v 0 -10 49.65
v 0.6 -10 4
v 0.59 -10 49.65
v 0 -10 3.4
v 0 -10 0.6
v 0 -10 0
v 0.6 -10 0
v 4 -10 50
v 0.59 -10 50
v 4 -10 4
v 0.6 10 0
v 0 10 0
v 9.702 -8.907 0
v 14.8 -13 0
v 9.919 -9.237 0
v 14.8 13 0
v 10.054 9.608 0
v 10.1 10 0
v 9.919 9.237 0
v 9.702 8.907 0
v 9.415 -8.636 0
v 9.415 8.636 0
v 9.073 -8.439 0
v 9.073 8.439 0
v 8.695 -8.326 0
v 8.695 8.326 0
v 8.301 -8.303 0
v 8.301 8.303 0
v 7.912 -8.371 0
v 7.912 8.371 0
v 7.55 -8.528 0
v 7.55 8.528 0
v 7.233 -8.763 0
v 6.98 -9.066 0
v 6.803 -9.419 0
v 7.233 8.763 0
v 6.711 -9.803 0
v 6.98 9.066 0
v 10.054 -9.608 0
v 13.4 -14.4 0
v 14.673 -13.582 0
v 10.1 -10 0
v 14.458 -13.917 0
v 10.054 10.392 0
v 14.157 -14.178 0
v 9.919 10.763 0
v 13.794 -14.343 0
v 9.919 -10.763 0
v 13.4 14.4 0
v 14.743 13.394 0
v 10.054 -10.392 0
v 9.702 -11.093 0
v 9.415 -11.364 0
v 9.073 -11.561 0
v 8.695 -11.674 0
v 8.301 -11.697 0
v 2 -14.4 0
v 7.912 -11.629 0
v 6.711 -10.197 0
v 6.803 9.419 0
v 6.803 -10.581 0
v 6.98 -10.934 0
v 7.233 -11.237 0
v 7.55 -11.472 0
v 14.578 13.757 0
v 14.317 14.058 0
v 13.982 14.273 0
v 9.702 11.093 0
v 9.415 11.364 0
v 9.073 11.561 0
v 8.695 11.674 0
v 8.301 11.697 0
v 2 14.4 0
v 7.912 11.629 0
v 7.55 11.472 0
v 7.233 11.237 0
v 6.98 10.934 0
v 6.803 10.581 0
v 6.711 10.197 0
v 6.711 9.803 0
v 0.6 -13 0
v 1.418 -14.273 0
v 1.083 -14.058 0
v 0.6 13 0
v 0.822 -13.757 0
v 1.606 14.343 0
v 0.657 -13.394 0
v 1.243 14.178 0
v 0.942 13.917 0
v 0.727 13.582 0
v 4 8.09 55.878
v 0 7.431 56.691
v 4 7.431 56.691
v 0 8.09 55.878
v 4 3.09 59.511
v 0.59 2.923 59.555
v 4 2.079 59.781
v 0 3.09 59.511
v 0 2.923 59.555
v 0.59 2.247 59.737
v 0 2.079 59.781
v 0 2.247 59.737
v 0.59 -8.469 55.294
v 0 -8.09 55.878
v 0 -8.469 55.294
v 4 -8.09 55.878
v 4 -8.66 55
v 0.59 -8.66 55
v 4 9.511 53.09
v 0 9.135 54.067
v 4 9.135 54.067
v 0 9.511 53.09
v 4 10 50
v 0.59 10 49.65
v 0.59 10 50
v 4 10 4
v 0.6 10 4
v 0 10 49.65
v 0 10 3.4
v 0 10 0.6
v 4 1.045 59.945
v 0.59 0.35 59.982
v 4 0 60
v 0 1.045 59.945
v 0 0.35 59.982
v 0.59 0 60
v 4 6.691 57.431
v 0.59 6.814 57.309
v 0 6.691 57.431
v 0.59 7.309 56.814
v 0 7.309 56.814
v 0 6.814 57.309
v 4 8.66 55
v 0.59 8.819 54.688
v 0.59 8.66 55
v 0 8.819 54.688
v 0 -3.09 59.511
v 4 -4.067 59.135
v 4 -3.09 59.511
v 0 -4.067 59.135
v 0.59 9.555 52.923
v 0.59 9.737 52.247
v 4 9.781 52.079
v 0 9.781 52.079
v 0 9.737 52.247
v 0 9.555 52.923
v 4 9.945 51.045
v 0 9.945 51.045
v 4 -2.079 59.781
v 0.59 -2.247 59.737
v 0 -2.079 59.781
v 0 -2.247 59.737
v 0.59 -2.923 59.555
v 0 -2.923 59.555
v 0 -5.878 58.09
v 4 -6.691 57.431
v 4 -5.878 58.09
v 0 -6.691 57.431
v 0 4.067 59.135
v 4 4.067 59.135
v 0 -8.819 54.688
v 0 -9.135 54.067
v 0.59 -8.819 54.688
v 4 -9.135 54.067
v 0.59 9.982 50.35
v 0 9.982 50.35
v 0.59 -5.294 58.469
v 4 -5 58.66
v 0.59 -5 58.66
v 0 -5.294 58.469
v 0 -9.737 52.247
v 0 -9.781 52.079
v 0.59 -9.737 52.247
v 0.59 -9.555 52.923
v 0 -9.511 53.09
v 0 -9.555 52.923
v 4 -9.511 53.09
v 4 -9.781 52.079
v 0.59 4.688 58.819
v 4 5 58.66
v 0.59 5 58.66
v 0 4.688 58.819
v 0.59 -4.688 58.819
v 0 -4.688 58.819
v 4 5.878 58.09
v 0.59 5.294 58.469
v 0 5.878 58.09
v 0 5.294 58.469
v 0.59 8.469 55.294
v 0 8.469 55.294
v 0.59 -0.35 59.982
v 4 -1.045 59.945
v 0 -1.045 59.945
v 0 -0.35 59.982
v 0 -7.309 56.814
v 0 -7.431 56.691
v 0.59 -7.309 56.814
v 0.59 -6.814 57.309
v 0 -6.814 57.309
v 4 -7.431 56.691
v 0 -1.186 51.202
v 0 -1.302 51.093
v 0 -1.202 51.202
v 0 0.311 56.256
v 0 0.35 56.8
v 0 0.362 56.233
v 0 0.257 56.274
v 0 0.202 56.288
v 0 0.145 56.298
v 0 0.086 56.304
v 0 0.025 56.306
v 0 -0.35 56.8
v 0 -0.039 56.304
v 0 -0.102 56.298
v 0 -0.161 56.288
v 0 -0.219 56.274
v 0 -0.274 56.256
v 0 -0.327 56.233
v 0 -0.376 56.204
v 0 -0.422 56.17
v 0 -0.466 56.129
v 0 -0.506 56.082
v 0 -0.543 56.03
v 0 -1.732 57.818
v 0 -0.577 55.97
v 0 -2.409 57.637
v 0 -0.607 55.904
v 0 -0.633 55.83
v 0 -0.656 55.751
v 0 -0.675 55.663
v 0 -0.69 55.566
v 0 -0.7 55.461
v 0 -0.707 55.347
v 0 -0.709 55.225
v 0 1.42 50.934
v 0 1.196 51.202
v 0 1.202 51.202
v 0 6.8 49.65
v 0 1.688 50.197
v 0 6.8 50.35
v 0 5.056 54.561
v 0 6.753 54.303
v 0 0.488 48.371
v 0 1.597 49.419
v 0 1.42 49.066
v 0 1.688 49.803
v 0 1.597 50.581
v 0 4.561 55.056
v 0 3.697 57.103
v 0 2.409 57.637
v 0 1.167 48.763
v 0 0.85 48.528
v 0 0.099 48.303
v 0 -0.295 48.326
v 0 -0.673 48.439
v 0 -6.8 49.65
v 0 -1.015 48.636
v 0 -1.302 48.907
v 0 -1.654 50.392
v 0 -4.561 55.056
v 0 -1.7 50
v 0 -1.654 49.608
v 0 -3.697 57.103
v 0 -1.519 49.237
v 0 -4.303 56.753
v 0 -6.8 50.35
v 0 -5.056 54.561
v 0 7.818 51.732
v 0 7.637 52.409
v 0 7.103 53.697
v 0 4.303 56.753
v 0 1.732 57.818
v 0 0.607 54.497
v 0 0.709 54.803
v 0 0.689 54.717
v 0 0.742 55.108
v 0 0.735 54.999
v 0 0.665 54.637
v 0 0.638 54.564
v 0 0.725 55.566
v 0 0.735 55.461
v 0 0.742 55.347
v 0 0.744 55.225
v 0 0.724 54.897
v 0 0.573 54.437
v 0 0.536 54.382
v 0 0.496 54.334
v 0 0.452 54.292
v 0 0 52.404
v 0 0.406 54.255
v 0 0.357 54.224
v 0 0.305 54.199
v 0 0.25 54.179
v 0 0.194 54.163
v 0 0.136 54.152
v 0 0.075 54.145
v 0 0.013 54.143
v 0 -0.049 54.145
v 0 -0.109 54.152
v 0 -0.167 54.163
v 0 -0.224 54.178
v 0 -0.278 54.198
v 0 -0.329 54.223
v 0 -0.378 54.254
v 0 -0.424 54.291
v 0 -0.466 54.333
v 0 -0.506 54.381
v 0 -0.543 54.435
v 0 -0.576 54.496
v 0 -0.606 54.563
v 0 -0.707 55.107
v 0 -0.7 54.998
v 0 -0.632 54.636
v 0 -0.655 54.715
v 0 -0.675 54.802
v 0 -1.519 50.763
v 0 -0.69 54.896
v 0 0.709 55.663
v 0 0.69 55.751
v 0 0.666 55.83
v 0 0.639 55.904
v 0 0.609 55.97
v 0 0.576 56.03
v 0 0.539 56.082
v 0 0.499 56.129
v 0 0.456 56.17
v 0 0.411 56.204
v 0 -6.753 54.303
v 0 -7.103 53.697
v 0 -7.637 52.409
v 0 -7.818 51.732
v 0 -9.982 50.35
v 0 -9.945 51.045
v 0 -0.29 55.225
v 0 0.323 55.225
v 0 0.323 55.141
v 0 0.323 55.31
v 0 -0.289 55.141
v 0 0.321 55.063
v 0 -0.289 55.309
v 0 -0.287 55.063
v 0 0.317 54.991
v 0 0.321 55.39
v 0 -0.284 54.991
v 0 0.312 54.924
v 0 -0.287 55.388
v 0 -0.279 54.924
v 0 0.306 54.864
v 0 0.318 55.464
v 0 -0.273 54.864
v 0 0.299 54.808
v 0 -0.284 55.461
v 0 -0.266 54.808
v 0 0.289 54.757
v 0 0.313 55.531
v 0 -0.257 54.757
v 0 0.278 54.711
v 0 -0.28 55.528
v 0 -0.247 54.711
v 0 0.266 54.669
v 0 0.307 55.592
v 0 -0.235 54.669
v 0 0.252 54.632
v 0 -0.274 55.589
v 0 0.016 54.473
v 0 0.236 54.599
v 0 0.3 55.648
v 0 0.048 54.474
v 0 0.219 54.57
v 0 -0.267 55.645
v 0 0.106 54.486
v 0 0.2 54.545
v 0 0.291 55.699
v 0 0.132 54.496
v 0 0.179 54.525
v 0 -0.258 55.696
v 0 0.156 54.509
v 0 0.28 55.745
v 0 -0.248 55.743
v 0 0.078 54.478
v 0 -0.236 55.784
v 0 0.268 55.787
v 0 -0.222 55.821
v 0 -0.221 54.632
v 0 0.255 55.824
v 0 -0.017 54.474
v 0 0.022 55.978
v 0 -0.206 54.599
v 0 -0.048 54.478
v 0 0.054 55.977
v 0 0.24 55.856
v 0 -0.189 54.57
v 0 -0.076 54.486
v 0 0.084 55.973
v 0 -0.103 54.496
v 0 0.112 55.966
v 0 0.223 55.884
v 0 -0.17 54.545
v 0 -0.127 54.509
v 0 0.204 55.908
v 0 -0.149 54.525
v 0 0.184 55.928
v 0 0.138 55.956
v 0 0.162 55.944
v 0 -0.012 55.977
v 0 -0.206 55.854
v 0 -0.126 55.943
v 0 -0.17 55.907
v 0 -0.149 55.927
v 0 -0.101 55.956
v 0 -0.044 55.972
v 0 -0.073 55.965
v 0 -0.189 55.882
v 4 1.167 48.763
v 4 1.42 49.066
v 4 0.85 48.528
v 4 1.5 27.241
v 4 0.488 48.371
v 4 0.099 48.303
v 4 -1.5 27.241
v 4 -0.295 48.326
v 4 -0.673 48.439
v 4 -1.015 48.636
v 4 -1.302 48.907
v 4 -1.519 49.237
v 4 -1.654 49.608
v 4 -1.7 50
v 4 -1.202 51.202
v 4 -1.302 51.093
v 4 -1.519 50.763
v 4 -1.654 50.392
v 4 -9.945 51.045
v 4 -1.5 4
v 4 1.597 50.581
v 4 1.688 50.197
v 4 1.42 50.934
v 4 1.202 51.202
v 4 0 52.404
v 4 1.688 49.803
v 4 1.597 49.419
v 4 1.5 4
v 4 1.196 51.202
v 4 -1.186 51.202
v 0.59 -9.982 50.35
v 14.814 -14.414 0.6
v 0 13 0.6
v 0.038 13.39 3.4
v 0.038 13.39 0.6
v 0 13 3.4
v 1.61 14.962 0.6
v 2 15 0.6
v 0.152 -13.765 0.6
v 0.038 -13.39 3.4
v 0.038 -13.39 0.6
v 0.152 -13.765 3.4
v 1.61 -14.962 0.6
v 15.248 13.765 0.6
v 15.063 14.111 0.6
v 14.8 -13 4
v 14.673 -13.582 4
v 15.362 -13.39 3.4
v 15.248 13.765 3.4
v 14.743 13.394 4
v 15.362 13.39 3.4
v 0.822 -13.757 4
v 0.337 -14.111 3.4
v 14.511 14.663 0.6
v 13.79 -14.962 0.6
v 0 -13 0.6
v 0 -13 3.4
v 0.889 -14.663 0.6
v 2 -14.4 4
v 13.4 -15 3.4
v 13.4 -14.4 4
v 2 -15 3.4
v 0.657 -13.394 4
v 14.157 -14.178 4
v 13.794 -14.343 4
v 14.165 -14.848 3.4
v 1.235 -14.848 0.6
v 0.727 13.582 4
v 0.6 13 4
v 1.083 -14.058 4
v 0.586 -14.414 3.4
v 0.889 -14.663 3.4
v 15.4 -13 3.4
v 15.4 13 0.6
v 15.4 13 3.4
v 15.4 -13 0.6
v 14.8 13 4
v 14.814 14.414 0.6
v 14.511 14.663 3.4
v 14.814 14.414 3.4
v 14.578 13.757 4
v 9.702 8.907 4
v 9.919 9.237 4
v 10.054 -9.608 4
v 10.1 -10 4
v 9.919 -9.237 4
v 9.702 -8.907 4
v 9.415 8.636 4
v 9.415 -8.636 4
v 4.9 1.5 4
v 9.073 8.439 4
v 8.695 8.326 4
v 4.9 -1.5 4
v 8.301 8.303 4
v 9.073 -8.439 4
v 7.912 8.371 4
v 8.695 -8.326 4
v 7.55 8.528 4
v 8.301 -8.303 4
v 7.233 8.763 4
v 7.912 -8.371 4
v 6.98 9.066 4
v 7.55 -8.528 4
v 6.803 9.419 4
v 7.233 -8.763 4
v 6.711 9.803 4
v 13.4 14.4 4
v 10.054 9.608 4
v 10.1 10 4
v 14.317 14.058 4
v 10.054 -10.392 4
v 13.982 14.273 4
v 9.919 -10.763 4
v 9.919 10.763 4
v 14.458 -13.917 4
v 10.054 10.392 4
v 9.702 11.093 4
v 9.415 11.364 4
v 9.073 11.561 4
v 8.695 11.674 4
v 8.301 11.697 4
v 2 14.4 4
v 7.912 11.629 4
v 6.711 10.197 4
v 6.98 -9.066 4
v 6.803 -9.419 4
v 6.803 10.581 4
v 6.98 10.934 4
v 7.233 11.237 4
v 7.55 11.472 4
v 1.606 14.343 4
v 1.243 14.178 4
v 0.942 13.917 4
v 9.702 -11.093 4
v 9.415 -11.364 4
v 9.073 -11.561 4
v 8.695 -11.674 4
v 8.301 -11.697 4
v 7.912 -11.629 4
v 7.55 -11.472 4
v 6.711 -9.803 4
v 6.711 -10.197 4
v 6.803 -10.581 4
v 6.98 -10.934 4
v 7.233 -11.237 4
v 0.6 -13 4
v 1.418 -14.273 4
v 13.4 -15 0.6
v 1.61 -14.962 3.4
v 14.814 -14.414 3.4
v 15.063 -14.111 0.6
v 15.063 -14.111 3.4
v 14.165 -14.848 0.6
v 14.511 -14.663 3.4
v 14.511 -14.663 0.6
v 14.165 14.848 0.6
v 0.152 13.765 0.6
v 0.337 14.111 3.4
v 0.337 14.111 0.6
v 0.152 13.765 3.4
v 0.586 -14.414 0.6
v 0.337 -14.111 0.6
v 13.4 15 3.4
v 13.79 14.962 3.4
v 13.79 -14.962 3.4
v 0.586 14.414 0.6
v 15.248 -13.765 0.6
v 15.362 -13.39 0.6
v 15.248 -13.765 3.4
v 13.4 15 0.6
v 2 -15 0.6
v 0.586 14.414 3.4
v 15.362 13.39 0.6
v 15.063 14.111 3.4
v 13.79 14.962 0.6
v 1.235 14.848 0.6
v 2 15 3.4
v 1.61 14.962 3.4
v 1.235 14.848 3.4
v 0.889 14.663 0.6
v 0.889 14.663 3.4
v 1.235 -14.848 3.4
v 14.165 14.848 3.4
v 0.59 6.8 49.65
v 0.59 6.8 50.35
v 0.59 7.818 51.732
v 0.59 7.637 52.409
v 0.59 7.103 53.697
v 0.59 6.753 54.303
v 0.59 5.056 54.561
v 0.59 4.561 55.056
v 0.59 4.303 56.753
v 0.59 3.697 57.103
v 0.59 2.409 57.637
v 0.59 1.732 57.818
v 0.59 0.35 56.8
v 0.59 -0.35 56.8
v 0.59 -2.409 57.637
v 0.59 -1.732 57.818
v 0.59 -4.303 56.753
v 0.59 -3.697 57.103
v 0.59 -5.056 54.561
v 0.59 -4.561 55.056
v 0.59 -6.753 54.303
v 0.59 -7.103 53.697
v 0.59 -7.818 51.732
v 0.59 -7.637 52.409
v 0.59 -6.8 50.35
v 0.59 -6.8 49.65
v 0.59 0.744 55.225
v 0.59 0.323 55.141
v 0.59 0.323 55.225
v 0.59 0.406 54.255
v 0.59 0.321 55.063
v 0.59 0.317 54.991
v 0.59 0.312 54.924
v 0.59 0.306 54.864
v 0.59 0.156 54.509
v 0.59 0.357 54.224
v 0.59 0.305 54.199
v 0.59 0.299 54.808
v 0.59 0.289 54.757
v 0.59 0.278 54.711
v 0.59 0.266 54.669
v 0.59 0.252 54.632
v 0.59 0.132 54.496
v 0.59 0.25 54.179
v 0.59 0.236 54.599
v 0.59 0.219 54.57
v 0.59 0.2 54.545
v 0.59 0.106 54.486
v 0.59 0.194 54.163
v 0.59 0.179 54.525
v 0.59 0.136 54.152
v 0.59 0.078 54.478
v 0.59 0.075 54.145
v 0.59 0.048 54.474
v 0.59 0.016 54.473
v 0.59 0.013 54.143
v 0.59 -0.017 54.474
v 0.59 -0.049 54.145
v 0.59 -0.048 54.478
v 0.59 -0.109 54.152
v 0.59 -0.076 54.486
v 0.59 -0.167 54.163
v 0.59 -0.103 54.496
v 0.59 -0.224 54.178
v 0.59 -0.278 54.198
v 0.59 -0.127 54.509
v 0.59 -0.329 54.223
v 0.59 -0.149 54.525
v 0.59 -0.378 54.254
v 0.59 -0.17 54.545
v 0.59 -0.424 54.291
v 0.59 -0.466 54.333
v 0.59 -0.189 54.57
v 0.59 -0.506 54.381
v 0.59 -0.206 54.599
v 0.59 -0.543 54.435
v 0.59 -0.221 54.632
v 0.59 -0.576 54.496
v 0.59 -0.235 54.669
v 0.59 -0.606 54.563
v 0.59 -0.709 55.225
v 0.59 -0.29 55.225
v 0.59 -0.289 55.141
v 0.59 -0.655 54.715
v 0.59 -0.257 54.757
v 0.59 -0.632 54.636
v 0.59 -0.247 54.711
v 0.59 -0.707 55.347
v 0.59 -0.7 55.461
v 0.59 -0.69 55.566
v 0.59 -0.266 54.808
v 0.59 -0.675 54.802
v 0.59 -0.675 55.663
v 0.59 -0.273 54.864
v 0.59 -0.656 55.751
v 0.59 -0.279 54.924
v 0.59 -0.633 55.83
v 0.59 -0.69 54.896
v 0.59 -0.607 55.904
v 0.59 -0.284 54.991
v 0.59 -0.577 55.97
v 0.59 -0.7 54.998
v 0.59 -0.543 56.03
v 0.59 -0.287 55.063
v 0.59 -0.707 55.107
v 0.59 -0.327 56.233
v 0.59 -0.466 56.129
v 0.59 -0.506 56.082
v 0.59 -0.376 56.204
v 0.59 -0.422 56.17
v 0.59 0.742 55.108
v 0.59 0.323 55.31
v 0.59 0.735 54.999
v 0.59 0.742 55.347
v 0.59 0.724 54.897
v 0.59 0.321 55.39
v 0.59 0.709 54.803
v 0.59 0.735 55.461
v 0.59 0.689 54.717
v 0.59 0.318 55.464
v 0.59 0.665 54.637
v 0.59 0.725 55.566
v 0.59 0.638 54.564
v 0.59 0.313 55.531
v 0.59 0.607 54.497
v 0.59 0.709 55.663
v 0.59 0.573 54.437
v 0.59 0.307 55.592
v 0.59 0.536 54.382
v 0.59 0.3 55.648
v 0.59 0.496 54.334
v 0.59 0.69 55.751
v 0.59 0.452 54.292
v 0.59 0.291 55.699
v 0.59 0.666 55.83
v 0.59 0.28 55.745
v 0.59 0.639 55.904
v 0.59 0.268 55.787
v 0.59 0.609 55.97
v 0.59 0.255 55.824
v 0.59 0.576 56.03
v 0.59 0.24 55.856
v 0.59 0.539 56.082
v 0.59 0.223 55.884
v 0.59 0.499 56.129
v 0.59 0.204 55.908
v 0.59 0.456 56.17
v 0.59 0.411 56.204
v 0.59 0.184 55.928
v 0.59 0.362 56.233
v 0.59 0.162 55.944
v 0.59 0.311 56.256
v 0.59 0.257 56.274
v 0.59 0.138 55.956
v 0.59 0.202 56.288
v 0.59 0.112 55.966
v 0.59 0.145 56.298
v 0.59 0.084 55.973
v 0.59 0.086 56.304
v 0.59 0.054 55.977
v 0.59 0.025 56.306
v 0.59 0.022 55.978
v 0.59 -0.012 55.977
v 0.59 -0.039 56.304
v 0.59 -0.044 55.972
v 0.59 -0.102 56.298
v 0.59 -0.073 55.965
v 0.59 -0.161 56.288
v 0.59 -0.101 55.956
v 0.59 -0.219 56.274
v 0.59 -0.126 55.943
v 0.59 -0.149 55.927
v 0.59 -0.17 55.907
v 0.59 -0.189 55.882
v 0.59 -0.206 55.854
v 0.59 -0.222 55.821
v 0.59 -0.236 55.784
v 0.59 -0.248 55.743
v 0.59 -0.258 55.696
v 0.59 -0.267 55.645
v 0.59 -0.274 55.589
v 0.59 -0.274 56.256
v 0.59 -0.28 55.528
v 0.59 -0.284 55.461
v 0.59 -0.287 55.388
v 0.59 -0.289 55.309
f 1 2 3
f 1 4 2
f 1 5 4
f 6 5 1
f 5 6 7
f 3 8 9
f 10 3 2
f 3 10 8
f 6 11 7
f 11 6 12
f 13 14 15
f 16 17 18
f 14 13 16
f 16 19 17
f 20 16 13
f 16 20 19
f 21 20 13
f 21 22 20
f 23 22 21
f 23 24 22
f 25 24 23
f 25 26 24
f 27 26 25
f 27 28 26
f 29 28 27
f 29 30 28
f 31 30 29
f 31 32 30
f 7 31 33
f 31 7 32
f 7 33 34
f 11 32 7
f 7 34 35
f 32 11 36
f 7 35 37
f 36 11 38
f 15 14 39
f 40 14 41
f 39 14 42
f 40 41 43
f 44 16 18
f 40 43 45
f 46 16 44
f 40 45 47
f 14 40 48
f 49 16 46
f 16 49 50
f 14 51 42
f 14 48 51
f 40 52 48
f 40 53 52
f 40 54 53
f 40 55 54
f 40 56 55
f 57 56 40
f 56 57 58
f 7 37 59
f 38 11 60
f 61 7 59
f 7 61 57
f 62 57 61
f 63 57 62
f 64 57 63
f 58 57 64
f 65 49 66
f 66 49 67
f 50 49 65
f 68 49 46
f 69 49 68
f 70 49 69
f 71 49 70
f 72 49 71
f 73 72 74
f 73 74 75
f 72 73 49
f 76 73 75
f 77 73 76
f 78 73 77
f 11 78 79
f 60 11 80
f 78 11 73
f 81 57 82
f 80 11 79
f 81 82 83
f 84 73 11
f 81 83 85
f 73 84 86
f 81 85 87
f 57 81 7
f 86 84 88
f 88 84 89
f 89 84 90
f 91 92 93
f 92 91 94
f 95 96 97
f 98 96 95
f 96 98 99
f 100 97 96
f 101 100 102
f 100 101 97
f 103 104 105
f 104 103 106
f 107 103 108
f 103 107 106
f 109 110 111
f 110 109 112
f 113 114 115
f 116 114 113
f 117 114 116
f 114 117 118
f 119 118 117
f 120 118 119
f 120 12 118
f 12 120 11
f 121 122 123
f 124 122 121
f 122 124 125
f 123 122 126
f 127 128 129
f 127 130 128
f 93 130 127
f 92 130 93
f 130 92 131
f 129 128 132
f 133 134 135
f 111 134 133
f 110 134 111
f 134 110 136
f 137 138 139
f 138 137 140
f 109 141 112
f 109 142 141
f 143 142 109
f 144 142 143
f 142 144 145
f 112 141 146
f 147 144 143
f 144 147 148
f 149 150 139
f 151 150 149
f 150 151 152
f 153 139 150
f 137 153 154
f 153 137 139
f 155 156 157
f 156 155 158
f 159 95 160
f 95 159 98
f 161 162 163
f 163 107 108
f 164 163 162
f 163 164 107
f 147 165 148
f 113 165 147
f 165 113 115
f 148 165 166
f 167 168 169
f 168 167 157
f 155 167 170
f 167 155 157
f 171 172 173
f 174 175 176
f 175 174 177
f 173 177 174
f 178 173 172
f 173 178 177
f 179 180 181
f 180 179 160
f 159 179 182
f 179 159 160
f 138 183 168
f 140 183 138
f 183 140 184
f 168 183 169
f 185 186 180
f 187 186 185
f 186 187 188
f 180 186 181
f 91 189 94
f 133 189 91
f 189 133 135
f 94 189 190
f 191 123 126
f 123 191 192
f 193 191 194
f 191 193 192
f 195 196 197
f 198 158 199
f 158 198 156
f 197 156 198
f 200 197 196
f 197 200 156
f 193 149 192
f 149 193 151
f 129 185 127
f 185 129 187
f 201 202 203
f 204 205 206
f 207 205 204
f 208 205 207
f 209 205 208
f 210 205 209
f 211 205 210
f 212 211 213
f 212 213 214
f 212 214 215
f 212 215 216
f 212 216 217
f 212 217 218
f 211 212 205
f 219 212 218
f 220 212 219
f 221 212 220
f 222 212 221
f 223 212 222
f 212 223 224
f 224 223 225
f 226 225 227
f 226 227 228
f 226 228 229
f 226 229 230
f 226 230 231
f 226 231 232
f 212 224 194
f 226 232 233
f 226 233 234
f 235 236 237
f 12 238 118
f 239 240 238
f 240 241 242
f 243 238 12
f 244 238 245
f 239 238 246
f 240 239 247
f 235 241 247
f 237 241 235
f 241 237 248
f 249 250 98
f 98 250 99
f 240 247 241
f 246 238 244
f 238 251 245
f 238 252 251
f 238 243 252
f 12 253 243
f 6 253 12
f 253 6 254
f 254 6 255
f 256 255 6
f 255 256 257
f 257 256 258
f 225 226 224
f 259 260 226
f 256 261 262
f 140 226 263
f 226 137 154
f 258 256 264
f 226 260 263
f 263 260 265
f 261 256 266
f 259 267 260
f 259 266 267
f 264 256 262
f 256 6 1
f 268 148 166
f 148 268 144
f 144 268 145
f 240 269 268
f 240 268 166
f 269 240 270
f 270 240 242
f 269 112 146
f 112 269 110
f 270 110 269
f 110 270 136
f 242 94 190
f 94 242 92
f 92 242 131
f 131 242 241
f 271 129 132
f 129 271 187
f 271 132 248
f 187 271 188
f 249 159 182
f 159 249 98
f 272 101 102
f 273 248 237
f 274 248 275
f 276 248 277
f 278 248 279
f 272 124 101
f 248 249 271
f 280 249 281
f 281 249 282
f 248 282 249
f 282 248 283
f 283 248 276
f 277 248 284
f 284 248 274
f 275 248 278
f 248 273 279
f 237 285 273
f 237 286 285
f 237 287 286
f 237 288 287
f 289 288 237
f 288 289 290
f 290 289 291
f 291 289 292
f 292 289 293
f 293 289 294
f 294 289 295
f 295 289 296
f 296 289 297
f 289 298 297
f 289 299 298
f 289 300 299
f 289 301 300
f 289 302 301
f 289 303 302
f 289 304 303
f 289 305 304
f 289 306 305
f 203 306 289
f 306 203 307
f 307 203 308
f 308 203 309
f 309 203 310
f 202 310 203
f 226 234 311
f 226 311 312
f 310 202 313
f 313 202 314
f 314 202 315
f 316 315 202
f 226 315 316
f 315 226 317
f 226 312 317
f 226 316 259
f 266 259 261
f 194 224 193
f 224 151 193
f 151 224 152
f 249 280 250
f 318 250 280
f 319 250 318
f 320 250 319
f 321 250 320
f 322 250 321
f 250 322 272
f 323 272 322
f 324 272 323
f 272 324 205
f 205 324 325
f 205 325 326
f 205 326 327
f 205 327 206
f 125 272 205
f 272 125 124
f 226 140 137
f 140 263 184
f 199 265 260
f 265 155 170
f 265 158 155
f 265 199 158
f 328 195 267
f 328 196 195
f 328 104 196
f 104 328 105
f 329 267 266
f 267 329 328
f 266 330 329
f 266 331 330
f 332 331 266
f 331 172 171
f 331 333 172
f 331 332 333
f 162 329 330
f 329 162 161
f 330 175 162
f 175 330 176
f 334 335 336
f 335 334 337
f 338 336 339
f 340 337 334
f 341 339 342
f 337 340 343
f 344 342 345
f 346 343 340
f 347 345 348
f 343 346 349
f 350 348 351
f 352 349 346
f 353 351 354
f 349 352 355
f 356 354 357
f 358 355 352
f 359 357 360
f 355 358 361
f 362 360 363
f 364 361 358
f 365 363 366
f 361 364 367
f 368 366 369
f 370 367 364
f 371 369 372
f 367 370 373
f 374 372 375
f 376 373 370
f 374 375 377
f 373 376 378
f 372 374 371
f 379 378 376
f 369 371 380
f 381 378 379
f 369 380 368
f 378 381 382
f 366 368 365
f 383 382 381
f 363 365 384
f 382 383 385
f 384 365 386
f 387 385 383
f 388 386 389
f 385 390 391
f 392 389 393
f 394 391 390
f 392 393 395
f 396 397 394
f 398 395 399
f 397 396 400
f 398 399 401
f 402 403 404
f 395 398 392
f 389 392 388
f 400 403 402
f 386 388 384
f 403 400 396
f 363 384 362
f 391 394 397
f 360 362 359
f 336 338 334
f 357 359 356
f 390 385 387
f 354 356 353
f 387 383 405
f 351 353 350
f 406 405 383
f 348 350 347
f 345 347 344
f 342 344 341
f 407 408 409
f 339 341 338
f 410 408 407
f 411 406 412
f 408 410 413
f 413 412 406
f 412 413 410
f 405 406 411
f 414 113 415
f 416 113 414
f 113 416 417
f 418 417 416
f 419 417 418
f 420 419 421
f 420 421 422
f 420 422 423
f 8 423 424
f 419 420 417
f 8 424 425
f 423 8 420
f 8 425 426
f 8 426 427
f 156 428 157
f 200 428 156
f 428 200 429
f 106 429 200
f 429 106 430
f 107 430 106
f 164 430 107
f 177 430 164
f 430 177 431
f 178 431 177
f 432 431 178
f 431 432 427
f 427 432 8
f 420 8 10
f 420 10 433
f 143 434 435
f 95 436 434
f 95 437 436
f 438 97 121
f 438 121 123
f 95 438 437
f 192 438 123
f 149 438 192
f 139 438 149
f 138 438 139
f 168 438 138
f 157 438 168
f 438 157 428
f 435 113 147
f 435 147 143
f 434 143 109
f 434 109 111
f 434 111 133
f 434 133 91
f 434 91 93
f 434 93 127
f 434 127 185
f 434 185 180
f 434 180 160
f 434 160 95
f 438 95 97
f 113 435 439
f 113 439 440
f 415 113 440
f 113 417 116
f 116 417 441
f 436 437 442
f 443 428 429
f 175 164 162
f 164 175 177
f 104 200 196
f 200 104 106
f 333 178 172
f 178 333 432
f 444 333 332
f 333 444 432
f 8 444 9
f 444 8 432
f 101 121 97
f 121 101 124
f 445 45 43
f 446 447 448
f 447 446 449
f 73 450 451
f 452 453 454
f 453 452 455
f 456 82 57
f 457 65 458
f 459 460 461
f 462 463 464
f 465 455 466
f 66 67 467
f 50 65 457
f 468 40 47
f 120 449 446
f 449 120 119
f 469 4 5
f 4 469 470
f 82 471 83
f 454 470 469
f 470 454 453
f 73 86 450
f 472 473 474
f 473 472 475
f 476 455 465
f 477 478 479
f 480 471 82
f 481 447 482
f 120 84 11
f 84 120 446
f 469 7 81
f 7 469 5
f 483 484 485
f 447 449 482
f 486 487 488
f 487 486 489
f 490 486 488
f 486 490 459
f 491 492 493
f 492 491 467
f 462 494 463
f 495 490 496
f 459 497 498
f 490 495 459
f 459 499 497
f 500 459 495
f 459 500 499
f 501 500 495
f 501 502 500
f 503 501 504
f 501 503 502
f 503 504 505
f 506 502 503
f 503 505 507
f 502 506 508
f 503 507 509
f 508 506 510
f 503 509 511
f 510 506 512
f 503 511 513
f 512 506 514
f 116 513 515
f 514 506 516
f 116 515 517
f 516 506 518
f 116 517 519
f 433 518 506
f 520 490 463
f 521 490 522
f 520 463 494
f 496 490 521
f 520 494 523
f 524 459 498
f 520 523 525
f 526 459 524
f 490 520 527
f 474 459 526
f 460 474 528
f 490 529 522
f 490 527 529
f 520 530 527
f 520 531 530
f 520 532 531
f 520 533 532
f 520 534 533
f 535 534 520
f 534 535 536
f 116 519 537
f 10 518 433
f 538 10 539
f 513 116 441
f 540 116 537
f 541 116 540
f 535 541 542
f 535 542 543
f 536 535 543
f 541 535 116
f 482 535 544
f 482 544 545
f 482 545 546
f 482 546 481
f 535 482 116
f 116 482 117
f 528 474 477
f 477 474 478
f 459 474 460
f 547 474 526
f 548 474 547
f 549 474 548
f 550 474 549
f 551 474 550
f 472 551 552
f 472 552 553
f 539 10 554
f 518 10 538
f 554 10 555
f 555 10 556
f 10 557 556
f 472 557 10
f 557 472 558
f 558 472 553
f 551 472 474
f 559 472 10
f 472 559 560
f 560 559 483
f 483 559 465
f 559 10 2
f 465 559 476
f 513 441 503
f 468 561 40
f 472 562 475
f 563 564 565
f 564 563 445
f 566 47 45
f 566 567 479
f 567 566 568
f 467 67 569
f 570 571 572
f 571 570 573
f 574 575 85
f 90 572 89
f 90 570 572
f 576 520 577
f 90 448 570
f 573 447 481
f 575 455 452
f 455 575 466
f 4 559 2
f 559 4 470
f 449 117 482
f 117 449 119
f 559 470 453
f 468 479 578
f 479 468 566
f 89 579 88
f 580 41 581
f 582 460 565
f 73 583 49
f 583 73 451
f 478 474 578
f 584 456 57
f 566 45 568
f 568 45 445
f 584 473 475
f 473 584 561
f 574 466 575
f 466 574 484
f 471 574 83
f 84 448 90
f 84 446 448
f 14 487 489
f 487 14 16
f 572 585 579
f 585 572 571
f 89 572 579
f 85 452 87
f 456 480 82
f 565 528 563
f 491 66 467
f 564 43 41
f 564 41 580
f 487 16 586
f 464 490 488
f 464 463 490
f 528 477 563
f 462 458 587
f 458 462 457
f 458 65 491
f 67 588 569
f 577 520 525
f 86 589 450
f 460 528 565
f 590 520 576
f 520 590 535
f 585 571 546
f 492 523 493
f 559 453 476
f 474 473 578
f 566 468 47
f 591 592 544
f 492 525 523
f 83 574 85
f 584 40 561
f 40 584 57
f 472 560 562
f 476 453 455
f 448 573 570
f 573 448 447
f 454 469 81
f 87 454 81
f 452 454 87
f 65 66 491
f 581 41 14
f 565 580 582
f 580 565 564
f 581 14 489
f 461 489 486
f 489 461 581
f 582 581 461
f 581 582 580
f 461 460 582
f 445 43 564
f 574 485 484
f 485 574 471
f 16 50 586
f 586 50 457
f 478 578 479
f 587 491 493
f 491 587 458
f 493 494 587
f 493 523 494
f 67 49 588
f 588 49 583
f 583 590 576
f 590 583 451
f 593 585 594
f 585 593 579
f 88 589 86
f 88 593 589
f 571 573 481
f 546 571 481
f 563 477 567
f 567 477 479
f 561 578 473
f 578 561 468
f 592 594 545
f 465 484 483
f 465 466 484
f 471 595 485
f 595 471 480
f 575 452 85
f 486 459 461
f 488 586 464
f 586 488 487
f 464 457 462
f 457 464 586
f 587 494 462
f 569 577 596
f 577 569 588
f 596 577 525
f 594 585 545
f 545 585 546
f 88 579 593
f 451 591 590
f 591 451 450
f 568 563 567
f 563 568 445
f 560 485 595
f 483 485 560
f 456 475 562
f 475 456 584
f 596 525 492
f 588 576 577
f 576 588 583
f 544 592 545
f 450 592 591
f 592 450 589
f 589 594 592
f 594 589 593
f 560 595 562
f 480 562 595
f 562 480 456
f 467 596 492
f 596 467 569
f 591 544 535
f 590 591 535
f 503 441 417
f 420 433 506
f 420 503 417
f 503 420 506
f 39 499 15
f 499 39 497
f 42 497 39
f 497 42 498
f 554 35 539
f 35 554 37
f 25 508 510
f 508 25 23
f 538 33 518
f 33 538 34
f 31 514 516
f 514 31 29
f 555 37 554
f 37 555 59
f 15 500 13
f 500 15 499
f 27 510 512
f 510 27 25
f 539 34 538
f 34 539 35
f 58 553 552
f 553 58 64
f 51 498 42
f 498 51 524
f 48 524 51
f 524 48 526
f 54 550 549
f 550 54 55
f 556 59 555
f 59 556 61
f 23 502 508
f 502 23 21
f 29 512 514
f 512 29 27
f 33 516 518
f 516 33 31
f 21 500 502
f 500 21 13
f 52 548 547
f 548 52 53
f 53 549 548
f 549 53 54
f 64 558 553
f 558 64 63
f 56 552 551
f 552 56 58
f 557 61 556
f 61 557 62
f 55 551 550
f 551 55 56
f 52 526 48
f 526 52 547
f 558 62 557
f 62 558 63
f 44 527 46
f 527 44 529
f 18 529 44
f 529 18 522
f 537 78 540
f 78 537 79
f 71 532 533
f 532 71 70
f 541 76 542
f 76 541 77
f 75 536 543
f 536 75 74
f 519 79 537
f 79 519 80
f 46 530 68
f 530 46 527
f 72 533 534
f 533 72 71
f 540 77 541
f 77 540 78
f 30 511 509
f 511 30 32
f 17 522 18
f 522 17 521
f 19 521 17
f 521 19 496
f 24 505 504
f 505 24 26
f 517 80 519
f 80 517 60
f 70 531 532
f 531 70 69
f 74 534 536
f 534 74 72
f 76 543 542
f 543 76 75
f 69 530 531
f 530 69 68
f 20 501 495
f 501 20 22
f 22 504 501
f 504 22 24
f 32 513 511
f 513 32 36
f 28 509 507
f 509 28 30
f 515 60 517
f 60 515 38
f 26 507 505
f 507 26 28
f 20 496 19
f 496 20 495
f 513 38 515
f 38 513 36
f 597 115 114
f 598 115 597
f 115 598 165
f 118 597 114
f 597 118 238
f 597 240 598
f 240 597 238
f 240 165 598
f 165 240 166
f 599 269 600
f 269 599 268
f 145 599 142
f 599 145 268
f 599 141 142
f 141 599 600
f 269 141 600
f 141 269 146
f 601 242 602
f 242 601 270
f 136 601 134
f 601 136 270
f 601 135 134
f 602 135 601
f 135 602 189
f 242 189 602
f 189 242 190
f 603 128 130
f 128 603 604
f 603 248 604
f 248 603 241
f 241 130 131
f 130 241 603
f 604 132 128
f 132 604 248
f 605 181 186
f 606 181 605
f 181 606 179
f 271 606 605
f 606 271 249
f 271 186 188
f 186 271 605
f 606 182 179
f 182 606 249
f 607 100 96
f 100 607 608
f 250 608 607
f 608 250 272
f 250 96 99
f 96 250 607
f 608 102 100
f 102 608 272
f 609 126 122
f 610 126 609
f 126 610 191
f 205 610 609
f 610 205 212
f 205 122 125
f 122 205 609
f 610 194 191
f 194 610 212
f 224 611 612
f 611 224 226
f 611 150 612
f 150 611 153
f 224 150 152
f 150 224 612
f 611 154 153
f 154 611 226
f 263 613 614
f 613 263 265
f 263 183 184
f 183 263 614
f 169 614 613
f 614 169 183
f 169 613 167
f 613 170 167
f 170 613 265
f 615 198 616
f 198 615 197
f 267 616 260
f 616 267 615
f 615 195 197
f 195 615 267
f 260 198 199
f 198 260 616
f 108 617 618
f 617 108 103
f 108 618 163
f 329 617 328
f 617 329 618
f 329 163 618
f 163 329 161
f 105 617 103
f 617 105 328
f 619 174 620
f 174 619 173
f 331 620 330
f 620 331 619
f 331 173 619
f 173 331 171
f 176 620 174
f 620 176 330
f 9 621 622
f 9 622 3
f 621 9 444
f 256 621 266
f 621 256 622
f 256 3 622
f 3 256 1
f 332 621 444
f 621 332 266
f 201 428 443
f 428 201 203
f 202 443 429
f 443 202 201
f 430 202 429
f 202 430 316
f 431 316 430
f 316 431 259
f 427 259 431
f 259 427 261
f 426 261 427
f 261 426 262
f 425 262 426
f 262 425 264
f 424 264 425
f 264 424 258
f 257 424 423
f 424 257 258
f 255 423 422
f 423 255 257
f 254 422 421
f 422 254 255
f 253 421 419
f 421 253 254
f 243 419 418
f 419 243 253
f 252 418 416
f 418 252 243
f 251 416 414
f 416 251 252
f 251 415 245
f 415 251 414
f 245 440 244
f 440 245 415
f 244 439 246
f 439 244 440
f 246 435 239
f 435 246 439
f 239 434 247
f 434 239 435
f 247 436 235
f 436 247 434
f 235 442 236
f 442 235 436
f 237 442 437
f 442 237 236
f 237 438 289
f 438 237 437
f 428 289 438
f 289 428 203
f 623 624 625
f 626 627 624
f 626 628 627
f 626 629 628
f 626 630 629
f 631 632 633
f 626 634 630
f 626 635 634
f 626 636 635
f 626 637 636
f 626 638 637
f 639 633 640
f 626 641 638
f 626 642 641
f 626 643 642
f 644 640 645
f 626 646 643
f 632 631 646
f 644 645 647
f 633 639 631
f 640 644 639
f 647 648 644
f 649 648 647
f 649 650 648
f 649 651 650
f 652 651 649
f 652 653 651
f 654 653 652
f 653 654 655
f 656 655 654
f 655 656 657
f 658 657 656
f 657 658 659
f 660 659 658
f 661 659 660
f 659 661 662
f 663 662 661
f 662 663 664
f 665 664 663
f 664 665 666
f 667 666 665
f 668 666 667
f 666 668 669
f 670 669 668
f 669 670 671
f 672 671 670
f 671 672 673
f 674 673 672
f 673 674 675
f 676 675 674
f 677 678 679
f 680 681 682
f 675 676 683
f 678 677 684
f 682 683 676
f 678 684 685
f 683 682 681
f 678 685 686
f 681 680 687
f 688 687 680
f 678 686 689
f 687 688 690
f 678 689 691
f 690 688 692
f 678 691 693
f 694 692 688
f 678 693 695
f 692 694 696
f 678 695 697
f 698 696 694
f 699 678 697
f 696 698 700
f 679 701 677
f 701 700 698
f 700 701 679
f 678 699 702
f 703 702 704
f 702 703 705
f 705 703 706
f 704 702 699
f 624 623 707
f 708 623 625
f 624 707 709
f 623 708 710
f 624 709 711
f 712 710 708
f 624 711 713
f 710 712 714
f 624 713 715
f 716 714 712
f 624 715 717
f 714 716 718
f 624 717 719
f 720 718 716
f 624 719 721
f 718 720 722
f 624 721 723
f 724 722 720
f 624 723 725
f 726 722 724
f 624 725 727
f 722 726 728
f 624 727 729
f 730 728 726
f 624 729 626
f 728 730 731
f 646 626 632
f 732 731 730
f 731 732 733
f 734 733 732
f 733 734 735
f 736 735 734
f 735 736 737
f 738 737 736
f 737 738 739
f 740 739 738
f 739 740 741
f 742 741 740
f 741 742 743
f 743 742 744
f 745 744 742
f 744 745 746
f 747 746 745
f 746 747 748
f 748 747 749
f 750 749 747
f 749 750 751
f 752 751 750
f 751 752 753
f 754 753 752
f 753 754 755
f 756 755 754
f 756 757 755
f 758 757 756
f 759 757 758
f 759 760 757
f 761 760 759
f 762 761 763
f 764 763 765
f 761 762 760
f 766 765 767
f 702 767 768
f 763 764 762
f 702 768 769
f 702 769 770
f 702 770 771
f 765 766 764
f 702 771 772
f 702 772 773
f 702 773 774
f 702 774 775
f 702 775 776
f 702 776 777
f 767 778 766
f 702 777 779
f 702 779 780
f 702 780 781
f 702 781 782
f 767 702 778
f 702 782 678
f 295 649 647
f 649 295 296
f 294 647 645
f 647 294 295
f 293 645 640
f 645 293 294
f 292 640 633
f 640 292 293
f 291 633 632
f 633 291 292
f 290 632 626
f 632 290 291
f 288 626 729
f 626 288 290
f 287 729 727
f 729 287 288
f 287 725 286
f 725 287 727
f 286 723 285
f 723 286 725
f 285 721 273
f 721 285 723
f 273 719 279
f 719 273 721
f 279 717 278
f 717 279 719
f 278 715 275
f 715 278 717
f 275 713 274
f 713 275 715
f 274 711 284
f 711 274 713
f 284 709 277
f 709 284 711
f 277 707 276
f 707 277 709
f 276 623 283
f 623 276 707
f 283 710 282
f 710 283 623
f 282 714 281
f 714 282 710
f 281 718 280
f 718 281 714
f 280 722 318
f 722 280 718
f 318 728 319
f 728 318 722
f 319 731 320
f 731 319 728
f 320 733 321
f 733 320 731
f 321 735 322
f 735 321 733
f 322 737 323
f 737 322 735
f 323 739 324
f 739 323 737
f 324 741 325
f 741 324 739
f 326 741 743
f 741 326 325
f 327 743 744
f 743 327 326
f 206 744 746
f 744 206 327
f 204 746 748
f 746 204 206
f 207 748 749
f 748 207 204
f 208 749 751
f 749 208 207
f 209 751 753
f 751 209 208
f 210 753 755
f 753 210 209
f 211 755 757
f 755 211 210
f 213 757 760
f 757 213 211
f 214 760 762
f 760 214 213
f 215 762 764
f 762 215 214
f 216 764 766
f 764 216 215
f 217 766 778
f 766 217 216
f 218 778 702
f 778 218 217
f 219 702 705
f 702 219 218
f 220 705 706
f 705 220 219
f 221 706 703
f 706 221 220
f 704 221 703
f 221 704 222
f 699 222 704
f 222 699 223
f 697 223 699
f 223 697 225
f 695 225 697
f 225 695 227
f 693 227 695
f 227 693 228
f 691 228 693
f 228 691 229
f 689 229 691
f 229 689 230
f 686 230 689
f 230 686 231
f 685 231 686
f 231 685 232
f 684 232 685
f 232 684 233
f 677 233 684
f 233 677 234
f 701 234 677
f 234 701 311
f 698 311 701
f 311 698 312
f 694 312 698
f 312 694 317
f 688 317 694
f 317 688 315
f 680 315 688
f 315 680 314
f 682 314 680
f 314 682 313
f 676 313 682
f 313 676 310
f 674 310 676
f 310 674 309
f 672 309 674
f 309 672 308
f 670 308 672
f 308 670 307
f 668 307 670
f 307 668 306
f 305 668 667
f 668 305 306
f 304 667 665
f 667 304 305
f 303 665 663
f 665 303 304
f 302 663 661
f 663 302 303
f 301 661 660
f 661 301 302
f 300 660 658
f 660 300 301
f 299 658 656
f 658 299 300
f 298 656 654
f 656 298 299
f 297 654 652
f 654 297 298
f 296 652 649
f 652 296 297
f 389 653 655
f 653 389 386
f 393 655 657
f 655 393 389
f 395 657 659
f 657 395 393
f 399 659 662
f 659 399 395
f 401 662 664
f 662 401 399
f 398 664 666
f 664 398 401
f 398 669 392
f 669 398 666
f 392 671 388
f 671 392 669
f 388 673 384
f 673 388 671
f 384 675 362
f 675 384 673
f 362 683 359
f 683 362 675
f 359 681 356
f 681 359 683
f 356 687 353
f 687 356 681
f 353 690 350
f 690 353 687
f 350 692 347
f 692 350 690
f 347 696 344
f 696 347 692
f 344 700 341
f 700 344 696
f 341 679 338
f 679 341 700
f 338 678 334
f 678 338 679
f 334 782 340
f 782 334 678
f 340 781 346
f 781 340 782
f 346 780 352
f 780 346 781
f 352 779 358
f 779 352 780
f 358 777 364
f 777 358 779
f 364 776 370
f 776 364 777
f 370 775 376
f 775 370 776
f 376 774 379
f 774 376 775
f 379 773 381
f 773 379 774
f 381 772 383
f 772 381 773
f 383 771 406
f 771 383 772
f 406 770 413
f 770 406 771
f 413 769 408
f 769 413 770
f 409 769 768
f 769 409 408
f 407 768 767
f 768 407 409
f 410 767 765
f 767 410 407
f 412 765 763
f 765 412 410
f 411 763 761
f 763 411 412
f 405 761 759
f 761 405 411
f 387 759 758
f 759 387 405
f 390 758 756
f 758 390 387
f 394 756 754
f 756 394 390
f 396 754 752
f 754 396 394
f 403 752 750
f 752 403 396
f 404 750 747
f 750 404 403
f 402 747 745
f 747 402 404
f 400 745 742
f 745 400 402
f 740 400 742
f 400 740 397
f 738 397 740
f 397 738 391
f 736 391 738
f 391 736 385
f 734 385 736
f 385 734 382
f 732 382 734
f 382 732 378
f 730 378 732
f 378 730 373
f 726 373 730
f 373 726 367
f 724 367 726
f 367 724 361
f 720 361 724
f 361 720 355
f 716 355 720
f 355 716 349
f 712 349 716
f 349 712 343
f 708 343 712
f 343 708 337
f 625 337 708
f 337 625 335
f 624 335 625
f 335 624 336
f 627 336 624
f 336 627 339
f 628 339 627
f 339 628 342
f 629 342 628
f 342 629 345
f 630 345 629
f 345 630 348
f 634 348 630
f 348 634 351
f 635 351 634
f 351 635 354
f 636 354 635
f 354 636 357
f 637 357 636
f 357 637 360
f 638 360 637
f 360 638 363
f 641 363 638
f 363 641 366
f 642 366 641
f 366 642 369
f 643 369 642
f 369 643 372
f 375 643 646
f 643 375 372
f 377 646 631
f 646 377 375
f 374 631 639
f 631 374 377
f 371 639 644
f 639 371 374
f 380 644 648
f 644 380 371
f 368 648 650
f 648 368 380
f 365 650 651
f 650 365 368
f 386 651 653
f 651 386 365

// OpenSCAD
// file: solar_panel_dims.scad
// shared solar-panel frame dimensions (included by frame + tilt bracket)
sp_pocket   = [solar_panel_size[0] + solar_panel_clear, solar_panel_size[1] + solar_panel_clear, solar_panel_size[2] + 0.3];
sp_wall     = 3;
sp_back     = 4;
sp_lip      = 2;
sp_outer    = [sp_pocket[0] + 2 * sp_wall, sp_pocket[1] + 2 * sp_wall, sp_back + sp_pocket[2] + sp_lip];
sp_boss_len = 8;
sp_boss_r   = 6;
sp_boss_z   = 6;
sp_boss_end = sp_outer[0] / 2 + sp_boss_len;
// file: ../stem_core.scad
// =====================================================================
//  stem_core.scad — shared geometry helpers for every STEM_KIT part.
// =====================================================================
include <../PARAMETERS/config.scad>
// =====================================================================

// ---------- rounded / chamfered prisms --------------------------------

// Rounded rectangle (2D), centred.
module rrect(size, r) {
    rr = min(r, min(size[0], size[1]) / 2 - 0.01);
    offset(r = rr) square([size[0] - 2 * rr, size[1] - 2 * rr], center = true);
}

// Box with rounded vertical edges, chamfered bottom edge (elephant-foot
// relief) and rounded-ish (chamfered) top edge. Sits on z = 0, centred XY.
module rbox(size, r = 2, top = edge_r, bottom = chamfer) {
    h = size[2];
    hull() {
        linear_extrude(0.01) rrect([size[0] - 2 * bottom, size[1] - 2 * bottom], max(r - bottom, 0.1));
        translate([0, 0, bottom]) linear_extrude(h - bottom - top) rrect([size[0], size[1]], r);
        translate([0, 0, h - 0.01]) linear_extrude(0.01) rrect([size[0] - 2 * top, size[1] - 2 * top], max(r - top, 0.1));
    }
}

// Cylinder with chamfered/rounded top and bottom edges (safe hubs, knobs).
module rcyl(d, h, top = edge_r, bottom = chamfer) {
    rotate_extrude() polygon([
        [0, 0], [d / 2 - bottom, 0], [d / 2, bottom],
        [d / 2, h - top], [d / 2 - top, h], [0, h]
    ]);
}

// Stadium (slot / rounded bar) 2D between two points on the X axis.
module stadium2d(len, w) {
    hull() { circle(d = w); translate([len, 0]) circle(d = w); }
}

// ---------- holes ------------------------------------------------------

// Vertical through hole with small top/bottom chamfers.
module vhole(d = grid_hole_d, h = 50, ch = 0.4) {
    translate([0, 0, -h / 2]) cylinder(d = d, h = h);
}

// Horizontal hole along +Y, printable without supports (teardrop tip up).
module teardrop_y(d, len, center = true) {
    translate([0, center ? -len / 2 : 0, 0]) rotate([-90, 0, 0])
        linear_extrude(len) teardrop2d(d);
}
module teardrop_x(d, len, center = true) {
    translate([center ? -len / 2 : 0, 0, 0]) rotate([0, 90, 0]) rotate([0, 0, -90])
        linear_extrude(len) teardrop2d(d);
}
// 2D teardrop: circle + 45° roof pointing "up" in the final part (+Z).
// After rotate([-90,0,0]) local +Y becomes -Z, so the roof points to -Y here.
module teardrop2d(d) {
    r = d / 2;
    union() {
        circle(d = d);
        polygon([[-r * sqrt(2) / 2, -r * sqrt(2) / 2], [0, -r * sqrt(2)], [r * sqrt(2) / 2, -r * sqrt(2) / 2]]);
    }
}

// Hex nut pocket (flat sides parallel to X), opening at z = 0 going +Z.
module nut_pocket(depth = nut_pocket_depth, af = nut_pocket_af) {
    cylinder(d = af / cos(30), h = depth, $fn = 6);
}

// Side-entry nut slot: nut plane is XY, slot opens toward +dir (X).
// Centred on the screw axis (Z), slot height nut_slot_t, runs out `len`.
module nut_slot_x(len = 10, af = nut_pocket_af, t = nut_slot_t) {
    translate([0, 0, -t / 2]) hull() {
        cylinder(d = af / cos(30), h = t, $fn = 6);
        translate([len, 0, 0]) cylinder(d = af / cos(30), h = t, $fn = 6);
    }
}

// Counterbored clearance hole from top surface at height `top` downward.
module cbore(top, depth, d = counterbore_d) {
    translate([0, 0, top - depth]) cylinder(d = d, h = depth + 20);
    translate([0, 0, -20]) cylinder(d = grid_hole_d, h = top + 40);
}

// Grid of vertical holes: nx x ny, pitch grid_pitch, first hole centred
// at `origin` (XY). Used by every plate.
module grid_holes(nx, ny, origin = [0, 0], h = 100, d = grid_hole_d) {
    for (i = [0 : nx - 1], j = [0 : ny - 1])
        translate([origin[0] + i * grid_pitch, origin[1] + j * grid_pitch, 0]) vhole(d, h);
}

// Slot (for adjustable mounting) along X, length = travel.
module slot_x(travel, d = grid_hole_d, h = 100) {
    translate([-travel / 2, 0, -h / 2]) linear_extrude(h) stadium2d(travel, d);
}

// ---------- shaft bores ------------------------------------------------

// 2D bore profile: round, or D if shaft_flat > 0.
module bore2d(d) {
    if (shaft_flat > 0)
        intersection() { circle(d = d); translate([-d, -d / 2]) square([2 * d, d - shaft_flat + (d - shaft_diameter) / 2]); }
    else circle(d = d);
}

// Standard HUB: cylinder hub_d x hub_h standing on z = z0, with bore,
// radial M3 set screw at mid height and a captive-nut slot from the top.
// Call inside difference() for the cut-outs: hub_body()/hub_cuts().
module hub_body(z0, d = hub_d, h = hub_h) {
    translate([0, 0, z0]) rcyl(d, h, top = 0.8, bottom = 0);
}
module hub_cuts(z0, total_h, d = hub_d, h = hub_h, bore = shaft_fixed_bore, set_screw = true, screw_angle = 0) {
    // bore through everything
    translate([0, 0, -1]) linear_extrude(total_h + 2) bore2d(bore);
    // entry chamfer on bore
    translate([0, 0, total_h - 0.6]) cylinder(d1 = bore, d2 = bore + 1.2, h = 0.61);
    translate([0, 0, -0.01]) cylinder(d1 = bore + 1.2, d2 = bore, h = 0.6);
    if (set_screw) rotate([0, 0, screw_angle]) {
        zs = z0 + h / 2;
        // radial screw hole (teardrop, prints without support)
        translate([0, 0, zs]) teardrop_x(screw_clear_d, d, center = false);
        // captive nut slot, entered from the hub top face
        nr = bore / 2 + (d / 2 - bore / 2) / 2;       // radial position of nut
        translate([nr - nut_slot_t / 2, -nut_pocket_af / 2, zs - nut_pocket_af / cos(30) / 2 - 0.1])
            cube([nut_slot_t, nut_pocket_af, total_h + 10]);   // open to the hub top face
    }
}

// ---------- labels -----------------------------------------------------

// Engrave text into a top surface at height z (depth 0.6 = 3 layers).
module engrave(txt, size = 5, z = 0, depth = 0.6, halign = "center") {
    translate([0, 0, z - depth]) linear_extrude(depth + 1)
        text(txt, size = size, font = "Liberation Sans:style=Bold", halign = halign, valign = "center");
}

// ---------- misc -------------------------------------------------------

function grid_snap(v) = ceil(v / grid_pitch) * grid_pitch;
// file: ../../PARAMETERS/config.scad
// =====================================================================
//  STEM_KIT — CENTRAL PARAMETER FILE  ("ForgeGrid" mechanical standard)
// ---------------------------------------------------------------------
//  Every part in the library includes this file. Change a value here,
//  run `python3 tools/build.py`, and the whole library regenerates.
//  All dimensions in millimetres.
// =====================================================================

// ---------------------------------------------------------------------
// 1. PRINTER / PROCESS
// ---------------------------------------------------------------------
nozzle          = 0.4;
layer_height    = 0.2;
tolerance       = 0.2;    // sliding clearance per side (tune with STEM_TOLERANCE_TEST)
press_allow     = 0.05;   // extra for press fits (bores that should grip)
min_wall        = 1.6;    // never go below this
wall_thickness  = 2.4;    // preferred wall (6 perimeters @ 0.4)
edge_r          = 1.0;    // rounding of exposed edges (child safety)
chamfer         = 0.6;    // bottom-edge chamfer (elephant-foot relief)

$fa = 6;                  // facet angle
$fs = 0.4;                // facet size

// ---------------------------------------------------------------------
// 2. GRID  (the heart of the ecosystem)
// ---------------------------------------------------------------------
//  Holes sit on a 10 mm lattice, 5 mm in from every plate edge, so
//  plates placed side by side keep one continuous lattice.
grid_pitch            = 10;
plate_size            = 100;   // universal base plate (square)
plate_thickness       = 6;     // base plates, rails, chassis
foot_thickness        = 4;     // flange / foot of every mount
//  => standard joint: 4 mm foot + 6 mm plate = M3 x 10 screw, nut in
//     the hex pocket under the plate. One screw length does 90 % of joints.

// ---------------------------------------------------------------------
// 3. FASTENERS (M3 everywhere: one screwdriver, one nut)
// ---------------------------------------------------------------------
screw_size            = 3;
screw_clear_d         = 3.4;   // clearance hole (also the grid hole)
grid_hole_d           = screw_clear_d;
screw_tap_d           = 2.6;   // hole a screw self-taps into
screw_head_d          = 5.7;   // ISO 7380 BUTTON head = kit standard (low, rounded, child-safe)
screw_head_h          = 1.65;
counterbore_d         = 6.4;
nut_af                = 5.5;   // M3 nut across flats
nut_thick             = 2.4;
nut_pocket_af         = nut_af + 0.35;
nut_pocket_depth      = 3.0;   // pocket under plates (nut sits flush)
nut_slot_t            = nut_thick + 0.4;  // side-entry slot thickness
set_screw_len         = 6;     // M3 x 6 grub screw for hubs

// ---------------------------------------------------------------------
// 4. SHAFTS
// ---------------------------------------------------------------------
//  Default: 3 mm steel rod (silver steel / stainless). Printed shafts
//  are provided for light-duty use. Alternative systems: set
//  shaft_diameter = 4 or 5 and rebuild.
shaft_diameter        = 3;
shaft_flat            = 0;     // >0 : D-shaft, flat depth (e.g. 0.5)
shaft_fixed_bore      = shaft_diameter + 0.15;  // hub bore (set-screw locked)
shaft_free_bore       = shaft_diameter + 0.4;   // free-spinning bore / bushing
shaft_lengths         = [40, 60, 80, 100, 120];

//  Horizontal shafts: all pillow blocks, motor mounts and axle mounts
//  put their axis at this height above the surface they are bolted to,
//  so any two of them on the grid are automatically coaxial/parallel.
axis_height           = 17;
axis_height_high      = 37;    // = axis_height + 2 pitches (pulleys, big wheels)

// ---------------------------------------------------------------------
// 5. BEARINGS
// ---------------------------------------------------------------------
bearing_size          = [5, 16, 5];   // 625 : bore, OD, width (default housing)
bearing_small         = [3, 10, 4];   // 623 : fits 3 mm shafts via adapter ring
bearing_pocket_d      = bearing_size[1] + 0.15;

// ---------------------------------------------------------------------
// 6. GEARS
// ---------------------------------------------------------------------
//  Module 2 + tooth counts that are multiples of 10  =>  centre distance
//  = (z1+z2) mm is ALWAYS a multiple of 10  =>  ANY two gears mesh when
//  their shafts sit in grid holes. (3-4-5 diagonals also work: 50 mm.)
gear_module           = 2;
gear_pressure_angle   = 20;
gear_width            = 6;
gear_backlash         = 0.30;  // total circular backlash per mesh
gear_clearance_k      = 0.25;  // root clearance = k * module
gear_teeth_set        = [10, 20, 30, 40];
//  Gearbox frame: two frame plates, outer faces 60 mm apart (on grid),
//  48 mm gap = three gear levels (A, M, B).
frame_gap             = 48;
hub_d                 = 14;
hub_h                 = 7;

// ---------------------------------------------------------------------
// 7. WHEELS / PULLEYS
// ---------------------------------------------------------------------
wheel_diameter        = 60;
wheel_width           = 10;
axle_diameter         = shaft_diameter;
oring_cs              = 3.0;    // O-ring cross-section used as tyre / belt
belt_cs               = 2.5;    // O-ring / round-belt cord for pulleys
pulley_sizes          = [20, 40, 60];  // effective (belt-line) diameters

// ---------------------------------------------------------------------
// 8. MOTORS (130-size toy / solar motor is the default)
// ---------------------------------------------------------------------
motor_size            = [20.2, 15.2, 25.2]; // body dia, across-flats, length
motor_d               = motor_size[0];
motor_flat            = motor_size[1];
motor_len             = motor_size[2];
motor_boss_d          = 6.2;
motor_boss_h          = 1.6;
motor_shaft_d         = 2.0;
motor_shaft_len       = 8.5;   // beyond boss
motor_shaft_bore      = 1.9;   // press fit onto 2 mm motor shaft

// ---------------------------------------------------------------------
// 9. SOLAR PANEL (bought, not printed) — frame is parametric
// ---------------------------------------------------------------------
solar_panel_size      = [110, 69, 3.0];  // 5 V 1 W epoxy panel (common)
solar_panel_clear     = 0.6;

// ---------------------------------------------------------------------
// 10. ELECTRONICS
// ---------------------------------------------------------------------
mounting_hole_spacing = grid_pitch;   // everything bolts to the grid
electronics_slot_w    = screw_clear_d;
led_hole_d            = 5.1;
buzzer_hole_d         = 12.2;

// ---------------------------------------------------------------------
// 11. SAFETY LIMITS (checked by tools/qc.py)
// ---------------------------------------------------------------------
max_part_voltage      = 12;    // nothing in this kit uses more
min_rim_thickness     = 2.0;   // blades/links: no edge thinner than this
finger_gap_max        = 6;     // guard openings smaller than a child's finger
// main file
// =====================================================================
//  PART: solar panel tilt bracket — COMMON/mounts
//  Upright that holds one end boss of the solar panel frame on a pivot
//  (M3 x 12 into the frame's captive nut; tighten = lock the angle).
//  An engraved angle scale (every 15°, 0° = panel flat) sits on the
//  inner face. Use two brackets (second one turned 180°).
//  The foot reaches out to the nearest grid line automatically.
//  Print: foot on the bed. No supports (teardrop pivot hole).
// =====================================================================
include <../../PARAMETERS/config.scad>
use <../stem_core.scad>
include <solar_panel_dims.scad>

pivot_height = 50;
solar_tilt_bracket(pivot_height);

// bracket local frame: inner face (touching the frame boss) at x = 0,
// bracket extends to +x. Returned helper: x of the foot holes.
function stb_hole_x() = let(xin = sp_boss_end + 0.3) (10 * ceil((xin + 4 + 3.2 - 5) / 10) + 5) - xin;

module solar_tilt_bracket(H = 50) {
    t = 4; w = 20;
    hx = stb_hole_x();
    fl = hx + 7;
    difference() {
        union() {
            // upright (plate in the YZ plane, thickness along +X)
            rotate([90, 0, 90]) linear_extrude(t) hull() {
                translate([-w / 2, 0]) square([w, 1]);
                translate([0, H]) circle(d = w);
            }
            // foot
            translate([fl / 2, 0, 0]) rbox([fl, 3 * grid_pitch, foot_thickness], r = 2, top = 0.6);
            // gusset
            translate([0, 1.5, 0]) rotate([90, 0, 0]) linear_extrude(3)
                polygon([[t - 0.01, foot_thickness - 0.01], [hx - 3.5, foot_thickness - 0.01], [t - 0.01, H * 0.55]]);
        }
        translate([0, 0, H]) teardrop_x(grid_hole_d, 3 * t);
        for (y = [-grid_pitch, grid_pitch]) translate([hx, y, 0]) vhole(grid_hole_d, 20);
        // angle scale on the inner face: ticks every 15°, long ticks at 0/±45/±90
        for (a = [-90 : 15 : 90]) translate([0, 0, H]) rotate([a, 0, 0])
            translate([-0.01, -0.35, w / 2 - (a % 45 == 0 ? 3.2 : 2)]) cube([0.6, 0.7, 5]);
        translate([-0.01, 0, H + w / 2 - 4.8]) rotate([90, 0, 90]) linear_extrude(0.6)
            text("0", size = 2.2, font = "Liberation Sans:style=Bold", halign = "center", valign = "center");
    }
}
